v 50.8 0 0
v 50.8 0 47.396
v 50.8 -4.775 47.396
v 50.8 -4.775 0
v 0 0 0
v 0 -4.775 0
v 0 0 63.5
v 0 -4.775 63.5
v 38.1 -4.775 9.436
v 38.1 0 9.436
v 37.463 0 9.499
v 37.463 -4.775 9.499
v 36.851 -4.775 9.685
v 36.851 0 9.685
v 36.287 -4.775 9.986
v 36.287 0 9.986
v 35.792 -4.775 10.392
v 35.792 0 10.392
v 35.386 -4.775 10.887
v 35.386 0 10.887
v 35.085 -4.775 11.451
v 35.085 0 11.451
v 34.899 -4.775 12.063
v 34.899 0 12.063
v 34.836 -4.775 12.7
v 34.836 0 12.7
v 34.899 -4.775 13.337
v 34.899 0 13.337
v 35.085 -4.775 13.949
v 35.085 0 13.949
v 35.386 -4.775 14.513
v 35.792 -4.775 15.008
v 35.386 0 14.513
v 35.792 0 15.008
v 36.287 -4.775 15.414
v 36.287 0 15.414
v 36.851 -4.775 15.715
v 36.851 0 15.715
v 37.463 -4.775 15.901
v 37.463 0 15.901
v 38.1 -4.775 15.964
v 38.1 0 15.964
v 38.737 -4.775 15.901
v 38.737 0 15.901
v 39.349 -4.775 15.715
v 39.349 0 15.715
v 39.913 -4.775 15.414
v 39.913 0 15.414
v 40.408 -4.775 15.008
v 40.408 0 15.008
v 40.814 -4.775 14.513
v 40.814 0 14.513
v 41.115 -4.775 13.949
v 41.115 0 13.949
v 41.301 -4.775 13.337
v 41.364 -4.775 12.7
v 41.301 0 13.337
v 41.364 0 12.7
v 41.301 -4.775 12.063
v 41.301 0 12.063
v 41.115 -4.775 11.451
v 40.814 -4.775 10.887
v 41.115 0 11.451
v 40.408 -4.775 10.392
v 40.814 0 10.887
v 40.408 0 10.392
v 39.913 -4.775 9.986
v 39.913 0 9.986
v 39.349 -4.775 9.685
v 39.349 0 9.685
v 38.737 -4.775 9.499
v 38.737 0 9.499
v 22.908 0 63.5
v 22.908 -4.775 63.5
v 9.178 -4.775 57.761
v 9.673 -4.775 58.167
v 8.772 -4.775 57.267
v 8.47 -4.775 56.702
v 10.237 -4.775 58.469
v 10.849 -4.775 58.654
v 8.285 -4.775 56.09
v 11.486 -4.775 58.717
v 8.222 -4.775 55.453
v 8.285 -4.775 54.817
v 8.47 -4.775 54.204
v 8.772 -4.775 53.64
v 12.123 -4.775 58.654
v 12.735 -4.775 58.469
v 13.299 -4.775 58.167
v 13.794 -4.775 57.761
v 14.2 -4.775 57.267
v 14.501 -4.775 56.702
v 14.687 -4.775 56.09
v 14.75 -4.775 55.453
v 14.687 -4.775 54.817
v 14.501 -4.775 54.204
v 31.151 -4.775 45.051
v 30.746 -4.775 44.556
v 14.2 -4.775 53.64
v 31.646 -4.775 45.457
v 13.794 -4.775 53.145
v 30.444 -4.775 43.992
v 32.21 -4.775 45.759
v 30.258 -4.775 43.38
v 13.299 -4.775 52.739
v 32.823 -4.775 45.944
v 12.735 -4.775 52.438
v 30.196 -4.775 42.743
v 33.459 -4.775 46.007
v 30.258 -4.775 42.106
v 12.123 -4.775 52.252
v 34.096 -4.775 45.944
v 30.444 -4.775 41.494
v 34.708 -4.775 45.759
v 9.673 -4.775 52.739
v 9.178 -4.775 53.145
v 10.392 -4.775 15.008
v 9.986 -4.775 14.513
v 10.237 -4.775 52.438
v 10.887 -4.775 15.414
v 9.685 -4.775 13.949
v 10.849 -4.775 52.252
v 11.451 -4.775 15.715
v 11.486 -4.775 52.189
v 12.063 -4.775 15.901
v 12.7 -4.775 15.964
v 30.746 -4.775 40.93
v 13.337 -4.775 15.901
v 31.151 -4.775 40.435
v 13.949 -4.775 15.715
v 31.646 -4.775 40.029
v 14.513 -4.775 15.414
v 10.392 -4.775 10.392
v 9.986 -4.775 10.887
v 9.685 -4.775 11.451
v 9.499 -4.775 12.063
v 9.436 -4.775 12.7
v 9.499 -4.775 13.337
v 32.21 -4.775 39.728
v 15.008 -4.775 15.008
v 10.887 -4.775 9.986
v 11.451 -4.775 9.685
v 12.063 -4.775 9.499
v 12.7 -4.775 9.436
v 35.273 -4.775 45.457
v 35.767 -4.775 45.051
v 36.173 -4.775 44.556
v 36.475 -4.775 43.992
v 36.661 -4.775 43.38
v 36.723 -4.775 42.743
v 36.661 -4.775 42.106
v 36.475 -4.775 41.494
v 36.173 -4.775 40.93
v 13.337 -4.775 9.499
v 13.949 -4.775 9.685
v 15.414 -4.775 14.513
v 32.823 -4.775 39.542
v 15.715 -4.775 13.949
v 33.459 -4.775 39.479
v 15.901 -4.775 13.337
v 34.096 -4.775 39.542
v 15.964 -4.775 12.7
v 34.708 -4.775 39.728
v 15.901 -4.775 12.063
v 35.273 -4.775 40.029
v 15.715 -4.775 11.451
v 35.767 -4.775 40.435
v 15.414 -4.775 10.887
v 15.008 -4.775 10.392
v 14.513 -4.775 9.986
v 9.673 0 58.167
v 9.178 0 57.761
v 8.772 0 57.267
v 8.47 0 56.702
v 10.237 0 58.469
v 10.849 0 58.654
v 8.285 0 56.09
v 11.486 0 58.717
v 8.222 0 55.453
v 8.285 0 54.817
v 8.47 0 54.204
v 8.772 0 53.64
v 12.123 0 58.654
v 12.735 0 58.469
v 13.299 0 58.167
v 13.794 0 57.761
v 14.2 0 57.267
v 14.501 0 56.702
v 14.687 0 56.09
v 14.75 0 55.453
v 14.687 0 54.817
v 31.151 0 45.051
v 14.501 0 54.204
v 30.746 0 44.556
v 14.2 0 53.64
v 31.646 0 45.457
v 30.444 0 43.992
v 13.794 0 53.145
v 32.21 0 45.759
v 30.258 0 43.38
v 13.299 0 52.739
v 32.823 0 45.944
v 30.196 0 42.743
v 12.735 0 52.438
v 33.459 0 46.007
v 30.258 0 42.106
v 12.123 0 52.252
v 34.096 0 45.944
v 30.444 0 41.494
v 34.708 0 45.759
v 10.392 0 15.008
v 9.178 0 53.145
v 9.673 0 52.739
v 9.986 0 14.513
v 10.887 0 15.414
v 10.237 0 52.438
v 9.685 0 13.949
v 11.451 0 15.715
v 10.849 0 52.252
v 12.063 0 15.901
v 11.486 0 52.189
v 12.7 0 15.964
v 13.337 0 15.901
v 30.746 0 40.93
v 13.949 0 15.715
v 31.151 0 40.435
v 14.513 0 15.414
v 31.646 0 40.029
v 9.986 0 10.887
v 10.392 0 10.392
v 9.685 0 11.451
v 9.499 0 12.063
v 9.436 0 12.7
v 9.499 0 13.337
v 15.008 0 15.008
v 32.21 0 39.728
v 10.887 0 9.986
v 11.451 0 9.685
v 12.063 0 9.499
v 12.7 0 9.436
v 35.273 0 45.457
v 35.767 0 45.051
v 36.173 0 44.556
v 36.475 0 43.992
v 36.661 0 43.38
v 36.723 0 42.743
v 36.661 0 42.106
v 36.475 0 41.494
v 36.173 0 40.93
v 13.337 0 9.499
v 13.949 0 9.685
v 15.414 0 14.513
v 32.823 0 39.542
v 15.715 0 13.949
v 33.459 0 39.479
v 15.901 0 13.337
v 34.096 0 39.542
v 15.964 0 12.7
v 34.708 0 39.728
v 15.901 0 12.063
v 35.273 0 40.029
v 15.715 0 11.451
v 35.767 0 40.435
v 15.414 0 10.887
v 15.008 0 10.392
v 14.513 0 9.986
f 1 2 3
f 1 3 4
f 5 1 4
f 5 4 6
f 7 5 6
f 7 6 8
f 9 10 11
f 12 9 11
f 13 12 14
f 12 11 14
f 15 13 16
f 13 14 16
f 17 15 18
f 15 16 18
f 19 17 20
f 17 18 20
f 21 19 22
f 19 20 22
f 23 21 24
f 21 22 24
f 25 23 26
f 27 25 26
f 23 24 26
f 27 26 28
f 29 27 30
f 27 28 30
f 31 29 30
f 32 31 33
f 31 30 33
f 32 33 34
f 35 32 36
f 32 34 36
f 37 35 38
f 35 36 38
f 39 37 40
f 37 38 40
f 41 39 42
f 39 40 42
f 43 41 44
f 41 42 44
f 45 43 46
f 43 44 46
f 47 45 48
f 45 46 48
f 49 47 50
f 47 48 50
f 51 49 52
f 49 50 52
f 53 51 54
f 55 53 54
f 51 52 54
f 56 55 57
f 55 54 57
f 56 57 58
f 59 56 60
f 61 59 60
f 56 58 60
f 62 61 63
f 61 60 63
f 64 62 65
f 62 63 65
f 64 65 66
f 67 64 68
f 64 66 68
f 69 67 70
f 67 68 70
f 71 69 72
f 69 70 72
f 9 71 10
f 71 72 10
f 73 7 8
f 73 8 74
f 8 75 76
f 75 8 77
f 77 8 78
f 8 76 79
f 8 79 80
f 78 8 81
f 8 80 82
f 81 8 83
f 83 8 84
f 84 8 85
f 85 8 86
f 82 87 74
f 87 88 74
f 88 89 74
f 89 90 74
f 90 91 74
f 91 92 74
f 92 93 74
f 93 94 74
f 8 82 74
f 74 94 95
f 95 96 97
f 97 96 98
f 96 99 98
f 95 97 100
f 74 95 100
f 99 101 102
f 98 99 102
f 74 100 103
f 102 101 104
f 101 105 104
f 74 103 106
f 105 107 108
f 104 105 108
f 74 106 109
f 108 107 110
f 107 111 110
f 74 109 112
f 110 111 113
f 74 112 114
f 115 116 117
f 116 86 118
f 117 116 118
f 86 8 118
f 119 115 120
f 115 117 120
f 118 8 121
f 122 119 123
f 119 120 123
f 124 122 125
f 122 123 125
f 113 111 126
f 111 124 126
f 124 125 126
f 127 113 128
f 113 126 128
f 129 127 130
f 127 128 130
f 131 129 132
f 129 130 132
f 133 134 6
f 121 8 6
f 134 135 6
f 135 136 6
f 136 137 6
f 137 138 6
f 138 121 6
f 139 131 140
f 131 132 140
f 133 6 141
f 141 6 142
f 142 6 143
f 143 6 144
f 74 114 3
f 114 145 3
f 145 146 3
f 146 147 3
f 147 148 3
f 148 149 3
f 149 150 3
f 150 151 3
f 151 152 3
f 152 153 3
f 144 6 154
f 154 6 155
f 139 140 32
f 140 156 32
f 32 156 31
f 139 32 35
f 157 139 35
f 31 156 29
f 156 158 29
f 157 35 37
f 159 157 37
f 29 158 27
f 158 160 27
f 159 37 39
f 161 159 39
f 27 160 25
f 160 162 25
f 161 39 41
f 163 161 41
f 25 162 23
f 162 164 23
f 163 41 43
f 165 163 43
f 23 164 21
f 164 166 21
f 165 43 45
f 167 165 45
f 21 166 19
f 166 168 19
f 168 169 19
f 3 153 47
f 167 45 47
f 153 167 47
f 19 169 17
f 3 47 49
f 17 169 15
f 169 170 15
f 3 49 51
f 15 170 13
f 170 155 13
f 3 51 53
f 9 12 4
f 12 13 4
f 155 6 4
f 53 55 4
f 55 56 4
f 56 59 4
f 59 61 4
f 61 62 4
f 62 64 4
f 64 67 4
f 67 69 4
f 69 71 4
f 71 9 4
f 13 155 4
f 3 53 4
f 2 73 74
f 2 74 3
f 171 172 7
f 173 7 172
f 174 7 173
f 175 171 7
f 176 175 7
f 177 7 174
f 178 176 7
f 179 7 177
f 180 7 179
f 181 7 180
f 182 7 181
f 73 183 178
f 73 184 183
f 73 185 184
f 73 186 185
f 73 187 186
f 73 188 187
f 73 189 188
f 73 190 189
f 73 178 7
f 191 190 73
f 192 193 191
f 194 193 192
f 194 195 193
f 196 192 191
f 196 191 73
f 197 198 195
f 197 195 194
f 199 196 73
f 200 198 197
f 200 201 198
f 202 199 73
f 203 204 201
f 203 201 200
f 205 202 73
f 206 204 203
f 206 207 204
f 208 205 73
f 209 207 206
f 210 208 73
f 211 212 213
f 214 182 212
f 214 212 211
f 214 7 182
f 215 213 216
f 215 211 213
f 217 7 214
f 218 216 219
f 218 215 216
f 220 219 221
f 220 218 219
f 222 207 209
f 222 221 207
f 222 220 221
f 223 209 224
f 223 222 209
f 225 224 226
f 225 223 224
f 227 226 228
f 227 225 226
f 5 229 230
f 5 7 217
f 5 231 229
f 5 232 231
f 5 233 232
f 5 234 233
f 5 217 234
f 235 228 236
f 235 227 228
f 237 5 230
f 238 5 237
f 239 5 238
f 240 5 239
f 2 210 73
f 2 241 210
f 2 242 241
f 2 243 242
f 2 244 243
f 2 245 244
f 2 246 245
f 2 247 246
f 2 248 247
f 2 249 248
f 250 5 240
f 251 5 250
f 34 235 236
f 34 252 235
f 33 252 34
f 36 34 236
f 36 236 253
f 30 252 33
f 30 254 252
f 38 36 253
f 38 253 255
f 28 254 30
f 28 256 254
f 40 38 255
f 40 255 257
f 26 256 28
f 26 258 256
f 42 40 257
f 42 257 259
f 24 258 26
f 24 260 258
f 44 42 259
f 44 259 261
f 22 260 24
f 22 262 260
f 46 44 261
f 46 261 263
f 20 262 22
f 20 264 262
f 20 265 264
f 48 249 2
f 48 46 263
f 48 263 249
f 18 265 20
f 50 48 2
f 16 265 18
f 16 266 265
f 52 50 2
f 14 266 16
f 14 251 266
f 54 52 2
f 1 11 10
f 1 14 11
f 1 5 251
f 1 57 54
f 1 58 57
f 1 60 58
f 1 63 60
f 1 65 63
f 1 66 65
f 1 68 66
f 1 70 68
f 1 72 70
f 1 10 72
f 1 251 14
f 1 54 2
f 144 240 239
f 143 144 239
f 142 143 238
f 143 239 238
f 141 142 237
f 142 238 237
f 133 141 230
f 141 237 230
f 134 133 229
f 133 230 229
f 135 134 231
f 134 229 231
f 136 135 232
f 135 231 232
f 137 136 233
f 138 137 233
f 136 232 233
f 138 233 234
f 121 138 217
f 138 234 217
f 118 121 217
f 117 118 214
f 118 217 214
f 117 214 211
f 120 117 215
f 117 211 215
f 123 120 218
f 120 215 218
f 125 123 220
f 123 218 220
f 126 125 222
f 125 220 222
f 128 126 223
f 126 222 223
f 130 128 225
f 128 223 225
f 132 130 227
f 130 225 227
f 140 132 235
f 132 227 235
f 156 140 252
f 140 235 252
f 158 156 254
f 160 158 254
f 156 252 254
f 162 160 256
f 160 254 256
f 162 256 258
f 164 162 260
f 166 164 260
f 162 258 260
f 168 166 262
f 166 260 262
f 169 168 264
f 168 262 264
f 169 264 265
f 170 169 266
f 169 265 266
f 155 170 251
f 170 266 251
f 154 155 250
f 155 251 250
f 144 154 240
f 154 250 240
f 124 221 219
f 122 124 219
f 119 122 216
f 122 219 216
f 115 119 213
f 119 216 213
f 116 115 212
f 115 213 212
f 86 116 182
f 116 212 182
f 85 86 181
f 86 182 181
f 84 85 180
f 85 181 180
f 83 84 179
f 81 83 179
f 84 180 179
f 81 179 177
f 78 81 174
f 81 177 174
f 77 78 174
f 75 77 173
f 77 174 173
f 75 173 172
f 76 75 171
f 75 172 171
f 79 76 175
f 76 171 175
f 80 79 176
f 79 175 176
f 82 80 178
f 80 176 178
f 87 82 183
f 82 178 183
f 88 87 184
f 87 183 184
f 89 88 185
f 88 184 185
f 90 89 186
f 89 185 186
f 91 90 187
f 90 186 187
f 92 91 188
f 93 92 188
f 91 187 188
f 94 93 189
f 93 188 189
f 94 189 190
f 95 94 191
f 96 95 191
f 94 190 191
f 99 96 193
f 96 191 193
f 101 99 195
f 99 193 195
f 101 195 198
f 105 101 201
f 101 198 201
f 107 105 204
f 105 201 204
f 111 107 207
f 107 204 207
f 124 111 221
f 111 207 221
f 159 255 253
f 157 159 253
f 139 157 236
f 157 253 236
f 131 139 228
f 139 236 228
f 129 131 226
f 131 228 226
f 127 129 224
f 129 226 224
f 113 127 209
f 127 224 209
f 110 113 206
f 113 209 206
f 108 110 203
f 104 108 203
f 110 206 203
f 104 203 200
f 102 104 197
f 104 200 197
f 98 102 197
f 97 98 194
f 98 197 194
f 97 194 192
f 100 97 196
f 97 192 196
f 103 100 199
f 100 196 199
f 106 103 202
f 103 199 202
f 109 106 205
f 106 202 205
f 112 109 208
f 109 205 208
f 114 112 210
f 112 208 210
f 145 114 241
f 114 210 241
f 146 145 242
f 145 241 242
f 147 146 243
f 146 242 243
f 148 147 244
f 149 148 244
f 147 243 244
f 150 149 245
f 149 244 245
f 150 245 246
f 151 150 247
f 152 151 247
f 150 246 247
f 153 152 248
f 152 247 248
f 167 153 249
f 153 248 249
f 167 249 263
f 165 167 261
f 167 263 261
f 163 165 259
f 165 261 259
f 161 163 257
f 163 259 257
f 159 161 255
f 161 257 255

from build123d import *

# Parameters (mm, degrees)
SKETCH1_R           = 3.2639
BOSS_EXTRUDE1_DEPTH = 4.7752


with BuildPart() as part:
    # Sketch1 (on Top Plane) → Boss-Extrude1 (new body)
    with BuildSketch(Plane(origin=(0, 0, 0), x_dir=(1, 0, 0), z_dir=(0, 1, 0))):
        Polygon((50.8, -47.3964), (50.8, 0), (0, 0), (0, -63.5), (22.907746615, -63.5), align=None)
        with Locations(Location((11.48588, -55.45328, 0), (0, 0, 90))):
            Circle(SKETCH1_R, mode=Mode.SUBTRACT)
        with Locations(Location((33.45942, -42.74312, 0), (0, 0, 90))):
            Circle(SKETCH1_R, mode=Mode.SUBTRACT)
        with Locations(Location((38.1, -12.7, 0), (0, 0, 90))):
            Circle(SKETCH1_R, mode=Mode.SUBTRACT)
        with Locations(Location((12.7, -12.7, 0), (0, 0, 90))):
            Circle(SKETCH1_R, mode=Mode.SUBTRACT)
    extrude(amount=-BOSS_EXTRUDE1_DEPTH)


solid = part.part
